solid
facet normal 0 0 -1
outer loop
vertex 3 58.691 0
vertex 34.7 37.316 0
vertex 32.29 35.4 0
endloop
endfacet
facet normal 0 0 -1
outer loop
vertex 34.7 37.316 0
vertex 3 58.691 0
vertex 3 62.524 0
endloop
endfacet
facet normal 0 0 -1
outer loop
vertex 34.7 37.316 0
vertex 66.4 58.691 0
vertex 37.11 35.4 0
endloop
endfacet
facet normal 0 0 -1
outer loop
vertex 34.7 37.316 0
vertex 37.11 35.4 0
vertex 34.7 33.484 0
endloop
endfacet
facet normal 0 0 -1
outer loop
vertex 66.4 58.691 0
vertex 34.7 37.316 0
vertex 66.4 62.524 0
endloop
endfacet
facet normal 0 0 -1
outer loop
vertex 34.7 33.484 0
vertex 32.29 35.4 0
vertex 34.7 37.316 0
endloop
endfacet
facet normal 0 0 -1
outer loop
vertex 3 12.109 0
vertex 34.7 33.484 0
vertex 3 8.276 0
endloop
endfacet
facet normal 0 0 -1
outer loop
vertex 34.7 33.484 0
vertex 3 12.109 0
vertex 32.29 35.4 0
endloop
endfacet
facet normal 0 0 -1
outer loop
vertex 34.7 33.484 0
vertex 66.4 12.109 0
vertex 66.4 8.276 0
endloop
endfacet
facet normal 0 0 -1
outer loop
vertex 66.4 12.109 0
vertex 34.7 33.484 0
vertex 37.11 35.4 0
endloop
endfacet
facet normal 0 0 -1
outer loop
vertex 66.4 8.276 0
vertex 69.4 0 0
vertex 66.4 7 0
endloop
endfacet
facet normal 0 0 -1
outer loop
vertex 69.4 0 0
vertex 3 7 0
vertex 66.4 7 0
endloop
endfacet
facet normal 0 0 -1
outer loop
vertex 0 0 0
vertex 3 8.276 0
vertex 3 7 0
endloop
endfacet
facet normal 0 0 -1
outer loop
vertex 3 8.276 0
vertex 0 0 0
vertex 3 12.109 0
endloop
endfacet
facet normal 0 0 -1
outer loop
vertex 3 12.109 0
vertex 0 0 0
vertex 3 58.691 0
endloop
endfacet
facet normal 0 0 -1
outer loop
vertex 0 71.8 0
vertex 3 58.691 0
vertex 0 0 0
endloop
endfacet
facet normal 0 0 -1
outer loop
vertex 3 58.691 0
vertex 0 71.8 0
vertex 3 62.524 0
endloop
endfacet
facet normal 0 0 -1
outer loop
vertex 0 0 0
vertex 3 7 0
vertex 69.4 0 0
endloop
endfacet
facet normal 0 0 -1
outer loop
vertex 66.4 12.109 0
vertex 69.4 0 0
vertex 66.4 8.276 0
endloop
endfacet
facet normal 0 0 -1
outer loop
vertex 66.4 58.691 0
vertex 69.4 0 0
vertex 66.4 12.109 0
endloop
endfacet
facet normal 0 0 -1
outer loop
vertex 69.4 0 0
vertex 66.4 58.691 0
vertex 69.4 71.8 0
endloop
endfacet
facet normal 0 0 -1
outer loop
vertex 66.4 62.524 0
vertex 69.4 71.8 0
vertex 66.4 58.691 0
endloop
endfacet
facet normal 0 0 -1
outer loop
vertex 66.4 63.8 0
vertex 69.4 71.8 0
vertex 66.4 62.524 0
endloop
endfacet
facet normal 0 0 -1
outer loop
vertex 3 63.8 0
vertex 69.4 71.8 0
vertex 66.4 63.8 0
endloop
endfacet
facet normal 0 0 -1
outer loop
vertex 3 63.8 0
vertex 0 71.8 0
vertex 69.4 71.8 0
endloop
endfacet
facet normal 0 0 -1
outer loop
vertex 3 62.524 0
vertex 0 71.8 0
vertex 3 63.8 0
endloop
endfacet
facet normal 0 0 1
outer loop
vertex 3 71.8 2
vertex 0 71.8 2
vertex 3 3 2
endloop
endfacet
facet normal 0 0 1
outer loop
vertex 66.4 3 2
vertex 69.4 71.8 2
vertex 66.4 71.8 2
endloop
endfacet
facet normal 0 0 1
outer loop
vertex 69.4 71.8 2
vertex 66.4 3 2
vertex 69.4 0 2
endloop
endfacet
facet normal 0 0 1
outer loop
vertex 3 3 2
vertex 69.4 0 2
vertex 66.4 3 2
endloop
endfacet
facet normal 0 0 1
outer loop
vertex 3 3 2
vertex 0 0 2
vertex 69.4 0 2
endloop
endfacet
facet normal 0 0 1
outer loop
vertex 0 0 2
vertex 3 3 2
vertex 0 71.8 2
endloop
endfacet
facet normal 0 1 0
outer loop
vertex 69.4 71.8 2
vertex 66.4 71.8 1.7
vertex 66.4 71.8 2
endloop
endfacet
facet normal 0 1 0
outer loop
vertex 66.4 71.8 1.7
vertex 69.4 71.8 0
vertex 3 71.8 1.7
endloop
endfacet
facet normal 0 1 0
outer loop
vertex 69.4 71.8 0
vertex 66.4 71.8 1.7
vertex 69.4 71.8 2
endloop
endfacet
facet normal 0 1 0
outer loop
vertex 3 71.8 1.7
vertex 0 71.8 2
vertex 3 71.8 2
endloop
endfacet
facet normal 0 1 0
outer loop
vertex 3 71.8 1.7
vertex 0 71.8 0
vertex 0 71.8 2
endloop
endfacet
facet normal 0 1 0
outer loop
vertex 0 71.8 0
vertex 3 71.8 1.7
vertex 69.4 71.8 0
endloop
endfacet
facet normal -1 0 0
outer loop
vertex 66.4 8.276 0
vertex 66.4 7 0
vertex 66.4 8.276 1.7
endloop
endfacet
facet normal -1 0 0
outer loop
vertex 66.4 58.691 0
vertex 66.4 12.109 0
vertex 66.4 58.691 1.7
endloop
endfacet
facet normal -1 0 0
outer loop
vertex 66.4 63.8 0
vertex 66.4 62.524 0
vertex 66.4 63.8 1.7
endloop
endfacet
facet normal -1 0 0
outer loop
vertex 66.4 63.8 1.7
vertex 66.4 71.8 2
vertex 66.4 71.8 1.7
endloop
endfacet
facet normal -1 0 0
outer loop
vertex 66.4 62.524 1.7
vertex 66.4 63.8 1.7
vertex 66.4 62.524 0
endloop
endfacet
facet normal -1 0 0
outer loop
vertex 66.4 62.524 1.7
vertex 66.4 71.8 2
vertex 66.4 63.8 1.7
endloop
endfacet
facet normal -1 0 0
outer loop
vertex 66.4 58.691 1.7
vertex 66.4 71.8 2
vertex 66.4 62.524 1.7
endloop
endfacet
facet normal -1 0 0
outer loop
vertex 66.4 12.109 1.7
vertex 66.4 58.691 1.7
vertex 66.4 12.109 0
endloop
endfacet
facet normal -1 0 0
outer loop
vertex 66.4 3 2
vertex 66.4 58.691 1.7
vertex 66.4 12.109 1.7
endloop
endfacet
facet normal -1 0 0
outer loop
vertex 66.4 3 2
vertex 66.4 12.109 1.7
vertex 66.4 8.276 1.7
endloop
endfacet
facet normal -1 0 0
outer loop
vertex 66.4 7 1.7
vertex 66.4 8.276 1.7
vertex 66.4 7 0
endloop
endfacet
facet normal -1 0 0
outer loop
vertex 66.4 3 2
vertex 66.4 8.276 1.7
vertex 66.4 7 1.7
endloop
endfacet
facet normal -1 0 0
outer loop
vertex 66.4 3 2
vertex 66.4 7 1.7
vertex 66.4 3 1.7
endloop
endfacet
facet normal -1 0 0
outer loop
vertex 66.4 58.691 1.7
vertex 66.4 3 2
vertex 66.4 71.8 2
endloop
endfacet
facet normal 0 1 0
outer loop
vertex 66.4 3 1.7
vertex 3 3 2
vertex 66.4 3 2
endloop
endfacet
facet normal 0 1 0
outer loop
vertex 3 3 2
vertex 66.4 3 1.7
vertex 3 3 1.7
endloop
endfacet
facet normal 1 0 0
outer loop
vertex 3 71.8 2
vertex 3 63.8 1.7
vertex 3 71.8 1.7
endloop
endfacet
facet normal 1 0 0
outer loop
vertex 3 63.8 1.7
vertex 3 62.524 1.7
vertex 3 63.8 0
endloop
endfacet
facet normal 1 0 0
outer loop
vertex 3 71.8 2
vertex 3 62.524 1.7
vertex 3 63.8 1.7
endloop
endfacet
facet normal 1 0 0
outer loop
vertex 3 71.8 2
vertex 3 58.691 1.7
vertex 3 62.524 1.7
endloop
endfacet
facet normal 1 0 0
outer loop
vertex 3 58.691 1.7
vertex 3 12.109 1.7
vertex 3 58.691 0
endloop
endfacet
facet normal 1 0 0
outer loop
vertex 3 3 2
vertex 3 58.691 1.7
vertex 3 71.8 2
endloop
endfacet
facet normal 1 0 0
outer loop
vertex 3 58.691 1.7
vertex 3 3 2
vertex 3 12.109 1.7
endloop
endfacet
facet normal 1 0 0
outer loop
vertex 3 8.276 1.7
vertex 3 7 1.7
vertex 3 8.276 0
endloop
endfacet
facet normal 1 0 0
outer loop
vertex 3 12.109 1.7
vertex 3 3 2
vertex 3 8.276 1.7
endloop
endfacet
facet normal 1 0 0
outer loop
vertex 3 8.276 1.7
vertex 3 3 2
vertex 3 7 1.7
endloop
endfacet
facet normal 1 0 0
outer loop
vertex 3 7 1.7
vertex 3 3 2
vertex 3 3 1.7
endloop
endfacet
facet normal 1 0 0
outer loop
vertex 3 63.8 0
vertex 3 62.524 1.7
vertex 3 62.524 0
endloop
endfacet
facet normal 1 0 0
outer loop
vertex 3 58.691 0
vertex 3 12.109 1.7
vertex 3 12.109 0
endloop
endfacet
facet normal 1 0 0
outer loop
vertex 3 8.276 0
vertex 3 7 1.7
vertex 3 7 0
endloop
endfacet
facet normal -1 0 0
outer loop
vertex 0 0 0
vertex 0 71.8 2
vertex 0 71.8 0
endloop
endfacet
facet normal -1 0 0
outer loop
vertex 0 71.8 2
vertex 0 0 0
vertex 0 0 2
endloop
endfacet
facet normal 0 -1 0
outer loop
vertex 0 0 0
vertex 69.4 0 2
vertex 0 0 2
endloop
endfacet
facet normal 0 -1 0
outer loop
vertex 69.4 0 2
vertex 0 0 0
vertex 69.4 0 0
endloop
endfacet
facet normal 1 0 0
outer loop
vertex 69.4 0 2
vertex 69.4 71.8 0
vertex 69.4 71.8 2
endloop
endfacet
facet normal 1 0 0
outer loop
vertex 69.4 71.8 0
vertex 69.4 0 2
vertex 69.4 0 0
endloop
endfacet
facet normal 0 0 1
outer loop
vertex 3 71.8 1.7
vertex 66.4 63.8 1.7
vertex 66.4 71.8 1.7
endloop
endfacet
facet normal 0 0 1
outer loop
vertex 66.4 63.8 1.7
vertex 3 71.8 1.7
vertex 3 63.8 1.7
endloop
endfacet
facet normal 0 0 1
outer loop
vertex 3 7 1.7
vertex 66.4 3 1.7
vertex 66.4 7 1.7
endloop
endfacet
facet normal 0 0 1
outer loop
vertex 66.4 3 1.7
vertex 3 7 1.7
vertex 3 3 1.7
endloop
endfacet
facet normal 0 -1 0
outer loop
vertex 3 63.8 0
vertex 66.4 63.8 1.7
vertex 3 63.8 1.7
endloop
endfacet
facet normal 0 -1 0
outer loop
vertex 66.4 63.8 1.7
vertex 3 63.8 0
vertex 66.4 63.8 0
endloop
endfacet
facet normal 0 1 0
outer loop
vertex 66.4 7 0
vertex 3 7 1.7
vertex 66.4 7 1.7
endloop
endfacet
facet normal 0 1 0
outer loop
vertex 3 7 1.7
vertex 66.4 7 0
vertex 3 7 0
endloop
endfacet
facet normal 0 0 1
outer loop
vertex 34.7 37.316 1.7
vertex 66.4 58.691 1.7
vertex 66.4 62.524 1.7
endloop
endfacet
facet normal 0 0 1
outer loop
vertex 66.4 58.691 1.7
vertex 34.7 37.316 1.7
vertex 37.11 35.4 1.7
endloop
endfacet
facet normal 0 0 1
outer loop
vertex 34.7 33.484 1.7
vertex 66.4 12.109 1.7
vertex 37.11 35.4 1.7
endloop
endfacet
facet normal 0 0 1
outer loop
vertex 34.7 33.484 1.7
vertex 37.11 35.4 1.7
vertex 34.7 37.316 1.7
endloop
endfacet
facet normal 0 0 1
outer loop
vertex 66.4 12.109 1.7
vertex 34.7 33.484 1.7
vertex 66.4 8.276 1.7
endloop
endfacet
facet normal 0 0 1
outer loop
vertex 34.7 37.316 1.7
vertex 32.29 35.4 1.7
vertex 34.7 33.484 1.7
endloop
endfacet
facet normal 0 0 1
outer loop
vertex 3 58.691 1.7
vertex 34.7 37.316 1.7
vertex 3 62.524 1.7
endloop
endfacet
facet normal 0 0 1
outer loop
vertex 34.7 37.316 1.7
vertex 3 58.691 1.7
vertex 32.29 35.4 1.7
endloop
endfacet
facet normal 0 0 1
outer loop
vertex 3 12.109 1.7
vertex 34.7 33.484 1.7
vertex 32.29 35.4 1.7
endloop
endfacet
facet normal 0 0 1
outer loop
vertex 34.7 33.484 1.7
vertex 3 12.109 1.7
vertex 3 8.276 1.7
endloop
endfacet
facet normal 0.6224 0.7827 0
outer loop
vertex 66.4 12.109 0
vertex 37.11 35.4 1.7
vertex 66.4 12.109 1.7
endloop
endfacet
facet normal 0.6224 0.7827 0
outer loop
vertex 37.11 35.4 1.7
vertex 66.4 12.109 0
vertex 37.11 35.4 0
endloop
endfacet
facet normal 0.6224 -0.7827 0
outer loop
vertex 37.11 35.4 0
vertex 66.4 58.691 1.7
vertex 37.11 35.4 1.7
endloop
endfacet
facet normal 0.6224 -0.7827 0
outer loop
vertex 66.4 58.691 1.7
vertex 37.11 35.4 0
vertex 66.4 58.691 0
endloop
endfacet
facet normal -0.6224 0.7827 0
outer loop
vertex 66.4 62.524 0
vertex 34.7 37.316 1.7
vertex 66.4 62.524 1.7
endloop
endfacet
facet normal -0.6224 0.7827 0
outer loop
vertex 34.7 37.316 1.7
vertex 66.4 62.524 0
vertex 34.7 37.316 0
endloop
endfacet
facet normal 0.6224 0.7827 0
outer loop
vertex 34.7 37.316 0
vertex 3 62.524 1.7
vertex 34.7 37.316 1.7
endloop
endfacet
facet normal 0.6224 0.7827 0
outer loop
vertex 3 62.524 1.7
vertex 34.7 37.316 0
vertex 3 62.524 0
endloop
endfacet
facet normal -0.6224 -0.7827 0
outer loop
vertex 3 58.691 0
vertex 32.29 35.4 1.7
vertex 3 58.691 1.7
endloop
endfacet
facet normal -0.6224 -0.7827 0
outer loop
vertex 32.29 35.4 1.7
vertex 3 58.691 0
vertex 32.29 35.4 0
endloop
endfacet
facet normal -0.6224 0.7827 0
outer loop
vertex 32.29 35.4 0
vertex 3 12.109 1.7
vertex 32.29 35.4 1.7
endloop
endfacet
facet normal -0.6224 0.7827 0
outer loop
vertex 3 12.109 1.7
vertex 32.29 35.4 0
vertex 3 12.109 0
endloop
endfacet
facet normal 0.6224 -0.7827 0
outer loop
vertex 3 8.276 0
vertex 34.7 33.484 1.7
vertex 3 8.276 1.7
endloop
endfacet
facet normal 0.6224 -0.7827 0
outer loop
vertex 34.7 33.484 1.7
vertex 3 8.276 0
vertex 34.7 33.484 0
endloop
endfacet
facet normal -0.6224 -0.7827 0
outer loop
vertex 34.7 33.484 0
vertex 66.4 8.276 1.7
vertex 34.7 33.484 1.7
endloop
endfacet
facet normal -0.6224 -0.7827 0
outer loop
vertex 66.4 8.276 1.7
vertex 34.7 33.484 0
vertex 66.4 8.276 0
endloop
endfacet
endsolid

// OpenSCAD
// measured + toleranced 
  card_w = 63.4;
  card_t = 0.3;
  //card_h = 87.9;

// design params
  // height of the label
  label_h = 4;
  // gap between cards and label
  space_h = 1.4;
  // general wall size
  wall = 3;
  // wall size at the open cut end
  cut_wall = 8;
  // gap from score line to braces (rough)
  brace_gap = 2;
  // piece thickness
  th = 2;


// computed: how far down to cut 
cut_h = label_h+space_h+card_w;

// technical
d=0.1;

linear_extrude(th) difference() {
  square([card_w+2*wall,wall+cut_h]);
  translate([wall,wall]) square([card_w,cut_h+d]);
}

linear_extrude(th-card_t) {
  translate([wall-d,wall-d]) square([card_w+2*d,label_h+d]);
  translate([wall-d,wall+cut_h-cut_wall])
    square([card_w+2*d,cut_wall]);
}

module brace() {
  open_w = card_w+wall;
  open_h = cut_h-label_h-cut_wall-2*brace_gap;
  inner_h = card_w-label_h-wall;
  translate([wall/2,wall+label_h+brace_gap])
    rotate(atan(open_h/open_w)) translate([-d,-wall/2])
    square([sqrt(open_w^2+open_h^2)+2*d,wall]);
}

linear_extrude(th-card_t) {
  brace();
  translate([card_w+2*wall,0]) mirror([1,0]) brace();
}
